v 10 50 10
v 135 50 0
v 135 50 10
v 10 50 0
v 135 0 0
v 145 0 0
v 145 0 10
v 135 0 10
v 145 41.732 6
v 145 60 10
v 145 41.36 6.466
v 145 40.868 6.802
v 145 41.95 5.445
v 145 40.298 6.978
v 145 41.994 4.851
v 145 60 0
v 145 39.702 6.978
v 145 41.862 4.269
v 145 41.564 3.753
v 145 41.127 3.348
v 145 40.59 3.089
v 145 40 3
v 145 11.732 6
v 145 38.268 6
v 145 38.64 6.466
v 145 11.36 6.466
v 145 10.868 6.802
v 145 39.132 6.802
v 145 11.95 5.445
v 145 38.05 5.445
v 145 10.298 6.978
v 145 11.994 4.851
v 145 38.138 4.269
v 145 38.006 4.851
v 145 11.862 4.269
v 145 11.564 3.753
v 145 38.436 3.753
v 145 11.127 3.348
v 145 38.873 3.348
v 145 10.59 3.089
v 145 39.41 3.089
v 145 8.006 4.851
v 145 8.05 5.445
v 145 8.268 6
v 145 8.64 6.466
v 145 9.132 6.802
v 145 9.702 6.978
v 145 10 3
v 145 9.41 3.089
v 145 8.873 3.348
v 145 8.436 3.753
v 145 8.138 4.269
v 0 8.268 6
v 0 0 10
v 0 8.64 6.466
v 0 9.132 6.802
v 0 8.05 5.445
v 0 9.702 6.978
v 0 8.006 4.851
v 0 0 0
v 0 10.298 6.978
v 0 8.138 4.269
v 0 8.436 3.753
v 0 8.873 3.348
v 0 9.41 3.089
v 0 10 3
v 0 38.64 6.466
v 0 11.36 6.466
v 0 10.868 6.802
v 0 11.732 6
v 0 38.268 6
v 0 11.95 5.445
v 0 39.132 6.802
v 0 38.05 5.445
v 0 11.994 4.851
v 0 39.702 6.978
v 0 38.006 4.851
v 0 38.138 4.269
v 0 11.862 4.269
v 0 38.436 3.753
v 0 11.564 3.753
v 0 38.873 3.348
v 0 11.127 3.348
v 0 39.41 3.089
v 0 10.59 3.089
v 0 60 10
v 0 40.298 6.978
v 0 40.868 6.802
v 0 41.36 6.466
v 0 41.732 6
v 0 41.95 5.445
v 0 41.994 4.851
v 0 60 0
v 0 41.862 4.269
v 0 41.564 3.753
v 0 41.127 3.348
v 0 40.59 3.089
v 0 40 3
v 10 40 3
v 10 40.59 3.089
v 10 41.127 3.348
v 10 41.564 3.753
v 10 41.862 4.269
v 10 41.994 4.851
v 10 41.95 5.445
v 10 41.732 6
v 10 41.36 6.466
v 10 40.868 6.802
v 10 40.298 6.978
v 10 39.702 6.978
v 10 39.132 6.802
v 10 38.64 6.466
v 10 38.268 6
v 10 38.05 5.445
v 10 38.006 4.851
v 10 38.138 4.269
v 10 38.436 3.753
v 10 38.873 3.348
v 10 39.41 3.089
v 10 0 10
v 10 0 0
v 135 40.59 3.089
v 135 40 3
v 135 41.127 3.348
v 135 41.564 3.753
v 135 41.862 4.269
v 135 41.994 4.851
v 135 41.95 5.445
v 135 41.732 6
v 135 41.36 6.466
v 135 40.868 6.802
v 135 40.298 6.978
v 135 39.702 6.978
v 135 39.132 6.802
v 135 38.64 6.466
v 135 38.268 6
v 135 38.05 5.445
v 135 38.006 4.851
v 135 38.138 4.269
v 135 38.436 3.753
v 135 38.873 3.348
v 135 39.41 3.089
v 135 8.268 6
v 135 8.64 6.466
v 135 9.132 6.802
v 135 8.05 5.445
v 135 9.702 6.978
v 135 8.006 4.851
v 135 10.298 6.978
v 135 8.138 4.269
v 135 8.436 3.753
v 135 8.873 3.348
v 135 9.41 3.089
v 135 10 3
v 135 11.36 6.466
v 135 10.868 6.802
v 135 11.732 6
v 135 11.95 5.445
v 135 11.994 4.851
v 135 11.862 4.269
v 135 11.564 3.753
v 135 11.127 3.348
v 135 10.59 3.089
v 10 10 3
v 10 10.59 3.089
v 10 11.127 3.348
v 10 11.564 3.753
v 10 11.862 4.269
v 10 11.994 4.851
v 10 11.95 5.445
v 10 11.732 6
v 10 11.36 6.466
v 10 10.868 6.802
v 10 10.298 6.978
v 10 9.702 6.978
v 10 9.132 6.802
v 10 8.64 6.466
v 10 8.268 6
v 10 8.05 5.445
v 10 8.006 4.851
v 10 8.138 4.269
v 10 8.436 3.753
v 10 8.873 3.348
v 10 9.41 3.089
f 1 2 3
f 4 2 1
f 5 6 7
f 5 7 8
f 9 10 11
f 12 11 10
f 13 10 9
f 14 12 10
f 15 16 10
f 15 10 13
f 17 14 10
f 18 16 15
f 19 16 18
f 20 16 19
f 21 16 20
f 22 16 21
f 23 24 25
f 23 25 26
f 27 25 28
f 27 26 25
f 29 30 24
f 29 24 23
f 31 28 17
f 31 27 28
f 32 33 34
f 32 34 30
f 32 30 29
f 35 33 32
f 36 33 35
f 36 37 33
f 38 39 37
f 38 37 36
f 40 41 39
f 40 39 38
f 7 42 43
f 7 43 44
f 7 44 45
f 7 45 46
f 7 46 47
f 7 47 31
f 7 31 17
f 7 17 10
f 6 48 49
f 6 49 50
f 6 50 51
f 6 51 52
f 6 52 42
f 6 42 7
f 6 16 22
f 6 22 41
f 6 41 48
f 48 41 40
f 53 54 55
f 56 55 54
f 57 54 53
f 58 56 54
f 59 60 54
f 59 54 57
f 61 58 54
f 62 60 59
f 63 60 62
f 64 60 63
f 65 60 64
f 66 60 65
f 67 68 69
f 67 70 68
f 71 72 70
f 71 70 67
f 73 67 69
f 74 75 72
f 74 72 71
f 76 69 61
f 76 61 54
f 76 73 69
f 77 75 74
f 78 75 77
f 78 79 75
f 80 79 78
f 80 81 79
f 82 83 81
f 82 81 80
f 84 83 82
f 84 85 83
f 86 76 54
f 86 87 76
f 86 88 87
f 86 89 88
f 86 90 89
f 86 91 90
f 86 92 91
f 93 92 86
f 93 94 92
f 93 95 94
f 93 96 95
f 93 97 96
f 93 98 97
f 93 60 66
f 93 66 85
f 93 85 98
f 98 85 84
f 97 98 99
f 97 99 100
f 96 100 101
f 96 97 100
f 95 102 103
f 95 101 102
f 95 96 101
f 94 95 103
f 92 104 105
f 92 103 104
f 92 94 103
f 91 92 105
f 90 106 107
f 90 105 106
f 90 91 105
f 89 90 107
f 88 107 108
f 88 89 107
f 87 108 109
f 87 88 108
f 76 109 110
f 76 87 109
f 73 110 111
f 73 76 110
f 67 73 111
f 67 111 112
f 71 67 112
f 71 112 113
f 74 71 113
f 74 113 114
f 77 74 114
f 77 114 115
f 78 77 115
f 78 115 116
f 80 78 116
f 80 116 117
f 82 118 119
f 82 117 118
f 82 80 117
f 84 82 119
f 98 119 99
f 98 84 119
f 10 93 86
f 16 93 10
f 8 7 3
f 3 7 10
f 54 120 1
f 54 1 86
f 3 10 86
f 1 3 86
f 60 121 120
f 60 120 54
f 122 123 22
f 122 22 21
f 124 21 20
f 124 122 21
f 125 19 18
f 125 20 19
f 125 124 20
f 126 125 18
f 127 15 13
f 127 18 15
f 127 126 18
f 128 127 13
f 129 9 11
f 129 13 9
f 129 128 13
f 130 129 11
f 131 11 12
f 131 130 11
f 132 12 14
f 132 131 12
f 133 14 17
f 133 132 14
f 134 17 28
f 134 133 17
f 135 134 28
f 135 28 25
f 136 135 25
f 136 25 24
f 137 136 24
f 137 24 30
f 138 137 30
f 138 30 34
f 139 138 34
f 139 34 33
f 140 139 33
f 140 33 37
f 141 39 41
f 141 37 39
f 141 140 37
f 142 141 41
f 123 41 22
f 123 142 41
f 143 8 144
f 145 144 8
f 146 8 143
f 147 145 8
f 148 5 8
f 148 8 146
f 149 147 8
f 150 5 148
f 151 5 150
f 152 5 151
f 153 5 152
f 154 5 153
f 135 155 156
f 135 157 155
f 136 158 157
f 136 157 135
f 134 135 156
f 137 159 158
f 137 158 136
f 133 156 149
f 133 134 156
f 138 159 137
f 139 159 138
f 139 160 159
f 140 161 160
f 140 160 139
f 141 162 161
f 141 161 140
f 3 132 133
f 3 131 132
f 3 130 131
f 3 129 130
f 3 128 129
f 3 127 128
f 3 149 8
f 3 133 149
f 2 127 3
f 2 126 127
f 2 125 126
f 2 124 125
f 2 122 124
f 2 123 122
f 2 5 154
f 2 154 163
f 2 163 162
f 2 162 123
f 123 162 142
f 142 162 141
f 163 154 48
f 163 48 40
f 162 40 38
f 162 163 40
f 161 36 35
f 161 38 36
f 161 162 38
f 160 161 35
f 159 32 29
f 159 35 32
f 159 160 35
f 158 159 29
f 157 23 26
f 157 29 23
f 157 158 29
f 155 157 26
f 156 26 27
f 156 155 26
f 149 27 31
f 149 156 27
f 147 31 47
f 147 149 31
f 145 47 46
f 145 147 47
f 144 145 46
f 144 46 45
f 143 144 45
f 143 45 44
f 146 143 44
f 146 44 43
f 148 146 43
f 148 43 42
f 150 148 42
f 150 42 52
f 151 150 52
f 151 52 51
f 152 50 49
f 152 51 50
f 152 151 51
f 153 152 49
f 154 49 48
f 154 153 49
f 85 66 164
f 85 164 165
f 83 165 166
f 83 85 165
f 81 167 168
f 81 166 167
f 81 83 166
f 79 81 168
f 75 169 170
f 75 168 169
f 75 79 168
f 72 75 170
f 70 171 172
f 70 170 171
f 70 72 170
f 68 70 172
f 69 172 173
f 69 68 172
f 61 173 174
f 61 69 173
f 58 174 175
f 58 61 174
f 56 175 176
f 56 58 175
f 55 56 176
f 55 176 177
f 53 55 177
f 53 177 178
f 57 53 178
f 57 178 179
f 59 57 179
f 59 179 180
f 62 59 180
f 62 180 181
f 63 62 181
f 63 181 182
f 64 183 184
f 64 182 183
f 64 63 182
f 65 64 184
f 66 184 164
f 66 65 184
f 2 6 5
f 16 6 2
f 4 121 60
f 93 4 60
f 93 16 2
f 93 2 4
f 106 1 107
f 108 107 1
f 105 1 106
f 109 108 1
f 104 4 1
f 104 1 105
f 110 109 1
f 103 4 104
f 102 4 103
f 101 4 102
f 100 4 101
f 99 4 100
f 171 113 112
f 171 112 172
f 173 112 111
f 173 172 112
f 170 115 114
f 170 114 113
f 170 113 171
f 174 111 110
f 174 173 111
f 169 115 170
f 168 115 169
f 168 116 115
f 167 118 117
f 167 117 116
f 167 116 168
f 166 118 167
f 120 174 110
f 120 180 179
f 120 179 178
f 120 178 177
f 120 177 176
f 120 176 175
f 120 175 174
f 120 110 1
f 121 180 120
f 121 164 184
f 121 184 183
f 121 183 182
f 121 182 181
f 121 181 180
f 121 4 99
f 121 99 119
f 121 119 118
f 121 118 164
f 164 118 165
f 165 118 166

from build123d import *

# Parameters (mm, degrees)
BOSS_EXTRUDE1_DEPTH     = 10
CUT_EXTRUDE1_DEPTH      = 158.241851935
CUT_EXTRUDE1_DEPTH_BACK = 158.241851935
SKETCH4_R               = 2


with BuildPart() as part:
    # Sketch1 → Boss-Extrude1 (new body)
    with BuildSketch(Plane.XY):
        Polygon((0, 0), (0, 60), (145, 60), (145, 0), (135, 0), (135, 50), (10, 50), (10, 0), align=None)
    extrude(amount=BOSS_EXTRUDE1_DEPTH)

    # Sketch4 → Cut-Extrude1 (cut, two sides: drawn at the far end of the back side and taken through both)
    with BuildSketch(Plane(origin=(145, 0, 0), x_dir=(0, 0, -1), z_dir=(1, 0, 0)).offset(-CUT_EXTRUDE1_DEPTH_BACK)):
        with Locations((-5, 10)):
            Circle(SKETCH4_R)
        with Locations((-5, 40)):
            Circle(SKETCH4_R)
    extrude(amount=CUT_EXTRUDE1_DEPTH + CUT_EXTRUDE1_DEPTH_BACK, mode=Mode.SUBTRACT)


solid = part.part
